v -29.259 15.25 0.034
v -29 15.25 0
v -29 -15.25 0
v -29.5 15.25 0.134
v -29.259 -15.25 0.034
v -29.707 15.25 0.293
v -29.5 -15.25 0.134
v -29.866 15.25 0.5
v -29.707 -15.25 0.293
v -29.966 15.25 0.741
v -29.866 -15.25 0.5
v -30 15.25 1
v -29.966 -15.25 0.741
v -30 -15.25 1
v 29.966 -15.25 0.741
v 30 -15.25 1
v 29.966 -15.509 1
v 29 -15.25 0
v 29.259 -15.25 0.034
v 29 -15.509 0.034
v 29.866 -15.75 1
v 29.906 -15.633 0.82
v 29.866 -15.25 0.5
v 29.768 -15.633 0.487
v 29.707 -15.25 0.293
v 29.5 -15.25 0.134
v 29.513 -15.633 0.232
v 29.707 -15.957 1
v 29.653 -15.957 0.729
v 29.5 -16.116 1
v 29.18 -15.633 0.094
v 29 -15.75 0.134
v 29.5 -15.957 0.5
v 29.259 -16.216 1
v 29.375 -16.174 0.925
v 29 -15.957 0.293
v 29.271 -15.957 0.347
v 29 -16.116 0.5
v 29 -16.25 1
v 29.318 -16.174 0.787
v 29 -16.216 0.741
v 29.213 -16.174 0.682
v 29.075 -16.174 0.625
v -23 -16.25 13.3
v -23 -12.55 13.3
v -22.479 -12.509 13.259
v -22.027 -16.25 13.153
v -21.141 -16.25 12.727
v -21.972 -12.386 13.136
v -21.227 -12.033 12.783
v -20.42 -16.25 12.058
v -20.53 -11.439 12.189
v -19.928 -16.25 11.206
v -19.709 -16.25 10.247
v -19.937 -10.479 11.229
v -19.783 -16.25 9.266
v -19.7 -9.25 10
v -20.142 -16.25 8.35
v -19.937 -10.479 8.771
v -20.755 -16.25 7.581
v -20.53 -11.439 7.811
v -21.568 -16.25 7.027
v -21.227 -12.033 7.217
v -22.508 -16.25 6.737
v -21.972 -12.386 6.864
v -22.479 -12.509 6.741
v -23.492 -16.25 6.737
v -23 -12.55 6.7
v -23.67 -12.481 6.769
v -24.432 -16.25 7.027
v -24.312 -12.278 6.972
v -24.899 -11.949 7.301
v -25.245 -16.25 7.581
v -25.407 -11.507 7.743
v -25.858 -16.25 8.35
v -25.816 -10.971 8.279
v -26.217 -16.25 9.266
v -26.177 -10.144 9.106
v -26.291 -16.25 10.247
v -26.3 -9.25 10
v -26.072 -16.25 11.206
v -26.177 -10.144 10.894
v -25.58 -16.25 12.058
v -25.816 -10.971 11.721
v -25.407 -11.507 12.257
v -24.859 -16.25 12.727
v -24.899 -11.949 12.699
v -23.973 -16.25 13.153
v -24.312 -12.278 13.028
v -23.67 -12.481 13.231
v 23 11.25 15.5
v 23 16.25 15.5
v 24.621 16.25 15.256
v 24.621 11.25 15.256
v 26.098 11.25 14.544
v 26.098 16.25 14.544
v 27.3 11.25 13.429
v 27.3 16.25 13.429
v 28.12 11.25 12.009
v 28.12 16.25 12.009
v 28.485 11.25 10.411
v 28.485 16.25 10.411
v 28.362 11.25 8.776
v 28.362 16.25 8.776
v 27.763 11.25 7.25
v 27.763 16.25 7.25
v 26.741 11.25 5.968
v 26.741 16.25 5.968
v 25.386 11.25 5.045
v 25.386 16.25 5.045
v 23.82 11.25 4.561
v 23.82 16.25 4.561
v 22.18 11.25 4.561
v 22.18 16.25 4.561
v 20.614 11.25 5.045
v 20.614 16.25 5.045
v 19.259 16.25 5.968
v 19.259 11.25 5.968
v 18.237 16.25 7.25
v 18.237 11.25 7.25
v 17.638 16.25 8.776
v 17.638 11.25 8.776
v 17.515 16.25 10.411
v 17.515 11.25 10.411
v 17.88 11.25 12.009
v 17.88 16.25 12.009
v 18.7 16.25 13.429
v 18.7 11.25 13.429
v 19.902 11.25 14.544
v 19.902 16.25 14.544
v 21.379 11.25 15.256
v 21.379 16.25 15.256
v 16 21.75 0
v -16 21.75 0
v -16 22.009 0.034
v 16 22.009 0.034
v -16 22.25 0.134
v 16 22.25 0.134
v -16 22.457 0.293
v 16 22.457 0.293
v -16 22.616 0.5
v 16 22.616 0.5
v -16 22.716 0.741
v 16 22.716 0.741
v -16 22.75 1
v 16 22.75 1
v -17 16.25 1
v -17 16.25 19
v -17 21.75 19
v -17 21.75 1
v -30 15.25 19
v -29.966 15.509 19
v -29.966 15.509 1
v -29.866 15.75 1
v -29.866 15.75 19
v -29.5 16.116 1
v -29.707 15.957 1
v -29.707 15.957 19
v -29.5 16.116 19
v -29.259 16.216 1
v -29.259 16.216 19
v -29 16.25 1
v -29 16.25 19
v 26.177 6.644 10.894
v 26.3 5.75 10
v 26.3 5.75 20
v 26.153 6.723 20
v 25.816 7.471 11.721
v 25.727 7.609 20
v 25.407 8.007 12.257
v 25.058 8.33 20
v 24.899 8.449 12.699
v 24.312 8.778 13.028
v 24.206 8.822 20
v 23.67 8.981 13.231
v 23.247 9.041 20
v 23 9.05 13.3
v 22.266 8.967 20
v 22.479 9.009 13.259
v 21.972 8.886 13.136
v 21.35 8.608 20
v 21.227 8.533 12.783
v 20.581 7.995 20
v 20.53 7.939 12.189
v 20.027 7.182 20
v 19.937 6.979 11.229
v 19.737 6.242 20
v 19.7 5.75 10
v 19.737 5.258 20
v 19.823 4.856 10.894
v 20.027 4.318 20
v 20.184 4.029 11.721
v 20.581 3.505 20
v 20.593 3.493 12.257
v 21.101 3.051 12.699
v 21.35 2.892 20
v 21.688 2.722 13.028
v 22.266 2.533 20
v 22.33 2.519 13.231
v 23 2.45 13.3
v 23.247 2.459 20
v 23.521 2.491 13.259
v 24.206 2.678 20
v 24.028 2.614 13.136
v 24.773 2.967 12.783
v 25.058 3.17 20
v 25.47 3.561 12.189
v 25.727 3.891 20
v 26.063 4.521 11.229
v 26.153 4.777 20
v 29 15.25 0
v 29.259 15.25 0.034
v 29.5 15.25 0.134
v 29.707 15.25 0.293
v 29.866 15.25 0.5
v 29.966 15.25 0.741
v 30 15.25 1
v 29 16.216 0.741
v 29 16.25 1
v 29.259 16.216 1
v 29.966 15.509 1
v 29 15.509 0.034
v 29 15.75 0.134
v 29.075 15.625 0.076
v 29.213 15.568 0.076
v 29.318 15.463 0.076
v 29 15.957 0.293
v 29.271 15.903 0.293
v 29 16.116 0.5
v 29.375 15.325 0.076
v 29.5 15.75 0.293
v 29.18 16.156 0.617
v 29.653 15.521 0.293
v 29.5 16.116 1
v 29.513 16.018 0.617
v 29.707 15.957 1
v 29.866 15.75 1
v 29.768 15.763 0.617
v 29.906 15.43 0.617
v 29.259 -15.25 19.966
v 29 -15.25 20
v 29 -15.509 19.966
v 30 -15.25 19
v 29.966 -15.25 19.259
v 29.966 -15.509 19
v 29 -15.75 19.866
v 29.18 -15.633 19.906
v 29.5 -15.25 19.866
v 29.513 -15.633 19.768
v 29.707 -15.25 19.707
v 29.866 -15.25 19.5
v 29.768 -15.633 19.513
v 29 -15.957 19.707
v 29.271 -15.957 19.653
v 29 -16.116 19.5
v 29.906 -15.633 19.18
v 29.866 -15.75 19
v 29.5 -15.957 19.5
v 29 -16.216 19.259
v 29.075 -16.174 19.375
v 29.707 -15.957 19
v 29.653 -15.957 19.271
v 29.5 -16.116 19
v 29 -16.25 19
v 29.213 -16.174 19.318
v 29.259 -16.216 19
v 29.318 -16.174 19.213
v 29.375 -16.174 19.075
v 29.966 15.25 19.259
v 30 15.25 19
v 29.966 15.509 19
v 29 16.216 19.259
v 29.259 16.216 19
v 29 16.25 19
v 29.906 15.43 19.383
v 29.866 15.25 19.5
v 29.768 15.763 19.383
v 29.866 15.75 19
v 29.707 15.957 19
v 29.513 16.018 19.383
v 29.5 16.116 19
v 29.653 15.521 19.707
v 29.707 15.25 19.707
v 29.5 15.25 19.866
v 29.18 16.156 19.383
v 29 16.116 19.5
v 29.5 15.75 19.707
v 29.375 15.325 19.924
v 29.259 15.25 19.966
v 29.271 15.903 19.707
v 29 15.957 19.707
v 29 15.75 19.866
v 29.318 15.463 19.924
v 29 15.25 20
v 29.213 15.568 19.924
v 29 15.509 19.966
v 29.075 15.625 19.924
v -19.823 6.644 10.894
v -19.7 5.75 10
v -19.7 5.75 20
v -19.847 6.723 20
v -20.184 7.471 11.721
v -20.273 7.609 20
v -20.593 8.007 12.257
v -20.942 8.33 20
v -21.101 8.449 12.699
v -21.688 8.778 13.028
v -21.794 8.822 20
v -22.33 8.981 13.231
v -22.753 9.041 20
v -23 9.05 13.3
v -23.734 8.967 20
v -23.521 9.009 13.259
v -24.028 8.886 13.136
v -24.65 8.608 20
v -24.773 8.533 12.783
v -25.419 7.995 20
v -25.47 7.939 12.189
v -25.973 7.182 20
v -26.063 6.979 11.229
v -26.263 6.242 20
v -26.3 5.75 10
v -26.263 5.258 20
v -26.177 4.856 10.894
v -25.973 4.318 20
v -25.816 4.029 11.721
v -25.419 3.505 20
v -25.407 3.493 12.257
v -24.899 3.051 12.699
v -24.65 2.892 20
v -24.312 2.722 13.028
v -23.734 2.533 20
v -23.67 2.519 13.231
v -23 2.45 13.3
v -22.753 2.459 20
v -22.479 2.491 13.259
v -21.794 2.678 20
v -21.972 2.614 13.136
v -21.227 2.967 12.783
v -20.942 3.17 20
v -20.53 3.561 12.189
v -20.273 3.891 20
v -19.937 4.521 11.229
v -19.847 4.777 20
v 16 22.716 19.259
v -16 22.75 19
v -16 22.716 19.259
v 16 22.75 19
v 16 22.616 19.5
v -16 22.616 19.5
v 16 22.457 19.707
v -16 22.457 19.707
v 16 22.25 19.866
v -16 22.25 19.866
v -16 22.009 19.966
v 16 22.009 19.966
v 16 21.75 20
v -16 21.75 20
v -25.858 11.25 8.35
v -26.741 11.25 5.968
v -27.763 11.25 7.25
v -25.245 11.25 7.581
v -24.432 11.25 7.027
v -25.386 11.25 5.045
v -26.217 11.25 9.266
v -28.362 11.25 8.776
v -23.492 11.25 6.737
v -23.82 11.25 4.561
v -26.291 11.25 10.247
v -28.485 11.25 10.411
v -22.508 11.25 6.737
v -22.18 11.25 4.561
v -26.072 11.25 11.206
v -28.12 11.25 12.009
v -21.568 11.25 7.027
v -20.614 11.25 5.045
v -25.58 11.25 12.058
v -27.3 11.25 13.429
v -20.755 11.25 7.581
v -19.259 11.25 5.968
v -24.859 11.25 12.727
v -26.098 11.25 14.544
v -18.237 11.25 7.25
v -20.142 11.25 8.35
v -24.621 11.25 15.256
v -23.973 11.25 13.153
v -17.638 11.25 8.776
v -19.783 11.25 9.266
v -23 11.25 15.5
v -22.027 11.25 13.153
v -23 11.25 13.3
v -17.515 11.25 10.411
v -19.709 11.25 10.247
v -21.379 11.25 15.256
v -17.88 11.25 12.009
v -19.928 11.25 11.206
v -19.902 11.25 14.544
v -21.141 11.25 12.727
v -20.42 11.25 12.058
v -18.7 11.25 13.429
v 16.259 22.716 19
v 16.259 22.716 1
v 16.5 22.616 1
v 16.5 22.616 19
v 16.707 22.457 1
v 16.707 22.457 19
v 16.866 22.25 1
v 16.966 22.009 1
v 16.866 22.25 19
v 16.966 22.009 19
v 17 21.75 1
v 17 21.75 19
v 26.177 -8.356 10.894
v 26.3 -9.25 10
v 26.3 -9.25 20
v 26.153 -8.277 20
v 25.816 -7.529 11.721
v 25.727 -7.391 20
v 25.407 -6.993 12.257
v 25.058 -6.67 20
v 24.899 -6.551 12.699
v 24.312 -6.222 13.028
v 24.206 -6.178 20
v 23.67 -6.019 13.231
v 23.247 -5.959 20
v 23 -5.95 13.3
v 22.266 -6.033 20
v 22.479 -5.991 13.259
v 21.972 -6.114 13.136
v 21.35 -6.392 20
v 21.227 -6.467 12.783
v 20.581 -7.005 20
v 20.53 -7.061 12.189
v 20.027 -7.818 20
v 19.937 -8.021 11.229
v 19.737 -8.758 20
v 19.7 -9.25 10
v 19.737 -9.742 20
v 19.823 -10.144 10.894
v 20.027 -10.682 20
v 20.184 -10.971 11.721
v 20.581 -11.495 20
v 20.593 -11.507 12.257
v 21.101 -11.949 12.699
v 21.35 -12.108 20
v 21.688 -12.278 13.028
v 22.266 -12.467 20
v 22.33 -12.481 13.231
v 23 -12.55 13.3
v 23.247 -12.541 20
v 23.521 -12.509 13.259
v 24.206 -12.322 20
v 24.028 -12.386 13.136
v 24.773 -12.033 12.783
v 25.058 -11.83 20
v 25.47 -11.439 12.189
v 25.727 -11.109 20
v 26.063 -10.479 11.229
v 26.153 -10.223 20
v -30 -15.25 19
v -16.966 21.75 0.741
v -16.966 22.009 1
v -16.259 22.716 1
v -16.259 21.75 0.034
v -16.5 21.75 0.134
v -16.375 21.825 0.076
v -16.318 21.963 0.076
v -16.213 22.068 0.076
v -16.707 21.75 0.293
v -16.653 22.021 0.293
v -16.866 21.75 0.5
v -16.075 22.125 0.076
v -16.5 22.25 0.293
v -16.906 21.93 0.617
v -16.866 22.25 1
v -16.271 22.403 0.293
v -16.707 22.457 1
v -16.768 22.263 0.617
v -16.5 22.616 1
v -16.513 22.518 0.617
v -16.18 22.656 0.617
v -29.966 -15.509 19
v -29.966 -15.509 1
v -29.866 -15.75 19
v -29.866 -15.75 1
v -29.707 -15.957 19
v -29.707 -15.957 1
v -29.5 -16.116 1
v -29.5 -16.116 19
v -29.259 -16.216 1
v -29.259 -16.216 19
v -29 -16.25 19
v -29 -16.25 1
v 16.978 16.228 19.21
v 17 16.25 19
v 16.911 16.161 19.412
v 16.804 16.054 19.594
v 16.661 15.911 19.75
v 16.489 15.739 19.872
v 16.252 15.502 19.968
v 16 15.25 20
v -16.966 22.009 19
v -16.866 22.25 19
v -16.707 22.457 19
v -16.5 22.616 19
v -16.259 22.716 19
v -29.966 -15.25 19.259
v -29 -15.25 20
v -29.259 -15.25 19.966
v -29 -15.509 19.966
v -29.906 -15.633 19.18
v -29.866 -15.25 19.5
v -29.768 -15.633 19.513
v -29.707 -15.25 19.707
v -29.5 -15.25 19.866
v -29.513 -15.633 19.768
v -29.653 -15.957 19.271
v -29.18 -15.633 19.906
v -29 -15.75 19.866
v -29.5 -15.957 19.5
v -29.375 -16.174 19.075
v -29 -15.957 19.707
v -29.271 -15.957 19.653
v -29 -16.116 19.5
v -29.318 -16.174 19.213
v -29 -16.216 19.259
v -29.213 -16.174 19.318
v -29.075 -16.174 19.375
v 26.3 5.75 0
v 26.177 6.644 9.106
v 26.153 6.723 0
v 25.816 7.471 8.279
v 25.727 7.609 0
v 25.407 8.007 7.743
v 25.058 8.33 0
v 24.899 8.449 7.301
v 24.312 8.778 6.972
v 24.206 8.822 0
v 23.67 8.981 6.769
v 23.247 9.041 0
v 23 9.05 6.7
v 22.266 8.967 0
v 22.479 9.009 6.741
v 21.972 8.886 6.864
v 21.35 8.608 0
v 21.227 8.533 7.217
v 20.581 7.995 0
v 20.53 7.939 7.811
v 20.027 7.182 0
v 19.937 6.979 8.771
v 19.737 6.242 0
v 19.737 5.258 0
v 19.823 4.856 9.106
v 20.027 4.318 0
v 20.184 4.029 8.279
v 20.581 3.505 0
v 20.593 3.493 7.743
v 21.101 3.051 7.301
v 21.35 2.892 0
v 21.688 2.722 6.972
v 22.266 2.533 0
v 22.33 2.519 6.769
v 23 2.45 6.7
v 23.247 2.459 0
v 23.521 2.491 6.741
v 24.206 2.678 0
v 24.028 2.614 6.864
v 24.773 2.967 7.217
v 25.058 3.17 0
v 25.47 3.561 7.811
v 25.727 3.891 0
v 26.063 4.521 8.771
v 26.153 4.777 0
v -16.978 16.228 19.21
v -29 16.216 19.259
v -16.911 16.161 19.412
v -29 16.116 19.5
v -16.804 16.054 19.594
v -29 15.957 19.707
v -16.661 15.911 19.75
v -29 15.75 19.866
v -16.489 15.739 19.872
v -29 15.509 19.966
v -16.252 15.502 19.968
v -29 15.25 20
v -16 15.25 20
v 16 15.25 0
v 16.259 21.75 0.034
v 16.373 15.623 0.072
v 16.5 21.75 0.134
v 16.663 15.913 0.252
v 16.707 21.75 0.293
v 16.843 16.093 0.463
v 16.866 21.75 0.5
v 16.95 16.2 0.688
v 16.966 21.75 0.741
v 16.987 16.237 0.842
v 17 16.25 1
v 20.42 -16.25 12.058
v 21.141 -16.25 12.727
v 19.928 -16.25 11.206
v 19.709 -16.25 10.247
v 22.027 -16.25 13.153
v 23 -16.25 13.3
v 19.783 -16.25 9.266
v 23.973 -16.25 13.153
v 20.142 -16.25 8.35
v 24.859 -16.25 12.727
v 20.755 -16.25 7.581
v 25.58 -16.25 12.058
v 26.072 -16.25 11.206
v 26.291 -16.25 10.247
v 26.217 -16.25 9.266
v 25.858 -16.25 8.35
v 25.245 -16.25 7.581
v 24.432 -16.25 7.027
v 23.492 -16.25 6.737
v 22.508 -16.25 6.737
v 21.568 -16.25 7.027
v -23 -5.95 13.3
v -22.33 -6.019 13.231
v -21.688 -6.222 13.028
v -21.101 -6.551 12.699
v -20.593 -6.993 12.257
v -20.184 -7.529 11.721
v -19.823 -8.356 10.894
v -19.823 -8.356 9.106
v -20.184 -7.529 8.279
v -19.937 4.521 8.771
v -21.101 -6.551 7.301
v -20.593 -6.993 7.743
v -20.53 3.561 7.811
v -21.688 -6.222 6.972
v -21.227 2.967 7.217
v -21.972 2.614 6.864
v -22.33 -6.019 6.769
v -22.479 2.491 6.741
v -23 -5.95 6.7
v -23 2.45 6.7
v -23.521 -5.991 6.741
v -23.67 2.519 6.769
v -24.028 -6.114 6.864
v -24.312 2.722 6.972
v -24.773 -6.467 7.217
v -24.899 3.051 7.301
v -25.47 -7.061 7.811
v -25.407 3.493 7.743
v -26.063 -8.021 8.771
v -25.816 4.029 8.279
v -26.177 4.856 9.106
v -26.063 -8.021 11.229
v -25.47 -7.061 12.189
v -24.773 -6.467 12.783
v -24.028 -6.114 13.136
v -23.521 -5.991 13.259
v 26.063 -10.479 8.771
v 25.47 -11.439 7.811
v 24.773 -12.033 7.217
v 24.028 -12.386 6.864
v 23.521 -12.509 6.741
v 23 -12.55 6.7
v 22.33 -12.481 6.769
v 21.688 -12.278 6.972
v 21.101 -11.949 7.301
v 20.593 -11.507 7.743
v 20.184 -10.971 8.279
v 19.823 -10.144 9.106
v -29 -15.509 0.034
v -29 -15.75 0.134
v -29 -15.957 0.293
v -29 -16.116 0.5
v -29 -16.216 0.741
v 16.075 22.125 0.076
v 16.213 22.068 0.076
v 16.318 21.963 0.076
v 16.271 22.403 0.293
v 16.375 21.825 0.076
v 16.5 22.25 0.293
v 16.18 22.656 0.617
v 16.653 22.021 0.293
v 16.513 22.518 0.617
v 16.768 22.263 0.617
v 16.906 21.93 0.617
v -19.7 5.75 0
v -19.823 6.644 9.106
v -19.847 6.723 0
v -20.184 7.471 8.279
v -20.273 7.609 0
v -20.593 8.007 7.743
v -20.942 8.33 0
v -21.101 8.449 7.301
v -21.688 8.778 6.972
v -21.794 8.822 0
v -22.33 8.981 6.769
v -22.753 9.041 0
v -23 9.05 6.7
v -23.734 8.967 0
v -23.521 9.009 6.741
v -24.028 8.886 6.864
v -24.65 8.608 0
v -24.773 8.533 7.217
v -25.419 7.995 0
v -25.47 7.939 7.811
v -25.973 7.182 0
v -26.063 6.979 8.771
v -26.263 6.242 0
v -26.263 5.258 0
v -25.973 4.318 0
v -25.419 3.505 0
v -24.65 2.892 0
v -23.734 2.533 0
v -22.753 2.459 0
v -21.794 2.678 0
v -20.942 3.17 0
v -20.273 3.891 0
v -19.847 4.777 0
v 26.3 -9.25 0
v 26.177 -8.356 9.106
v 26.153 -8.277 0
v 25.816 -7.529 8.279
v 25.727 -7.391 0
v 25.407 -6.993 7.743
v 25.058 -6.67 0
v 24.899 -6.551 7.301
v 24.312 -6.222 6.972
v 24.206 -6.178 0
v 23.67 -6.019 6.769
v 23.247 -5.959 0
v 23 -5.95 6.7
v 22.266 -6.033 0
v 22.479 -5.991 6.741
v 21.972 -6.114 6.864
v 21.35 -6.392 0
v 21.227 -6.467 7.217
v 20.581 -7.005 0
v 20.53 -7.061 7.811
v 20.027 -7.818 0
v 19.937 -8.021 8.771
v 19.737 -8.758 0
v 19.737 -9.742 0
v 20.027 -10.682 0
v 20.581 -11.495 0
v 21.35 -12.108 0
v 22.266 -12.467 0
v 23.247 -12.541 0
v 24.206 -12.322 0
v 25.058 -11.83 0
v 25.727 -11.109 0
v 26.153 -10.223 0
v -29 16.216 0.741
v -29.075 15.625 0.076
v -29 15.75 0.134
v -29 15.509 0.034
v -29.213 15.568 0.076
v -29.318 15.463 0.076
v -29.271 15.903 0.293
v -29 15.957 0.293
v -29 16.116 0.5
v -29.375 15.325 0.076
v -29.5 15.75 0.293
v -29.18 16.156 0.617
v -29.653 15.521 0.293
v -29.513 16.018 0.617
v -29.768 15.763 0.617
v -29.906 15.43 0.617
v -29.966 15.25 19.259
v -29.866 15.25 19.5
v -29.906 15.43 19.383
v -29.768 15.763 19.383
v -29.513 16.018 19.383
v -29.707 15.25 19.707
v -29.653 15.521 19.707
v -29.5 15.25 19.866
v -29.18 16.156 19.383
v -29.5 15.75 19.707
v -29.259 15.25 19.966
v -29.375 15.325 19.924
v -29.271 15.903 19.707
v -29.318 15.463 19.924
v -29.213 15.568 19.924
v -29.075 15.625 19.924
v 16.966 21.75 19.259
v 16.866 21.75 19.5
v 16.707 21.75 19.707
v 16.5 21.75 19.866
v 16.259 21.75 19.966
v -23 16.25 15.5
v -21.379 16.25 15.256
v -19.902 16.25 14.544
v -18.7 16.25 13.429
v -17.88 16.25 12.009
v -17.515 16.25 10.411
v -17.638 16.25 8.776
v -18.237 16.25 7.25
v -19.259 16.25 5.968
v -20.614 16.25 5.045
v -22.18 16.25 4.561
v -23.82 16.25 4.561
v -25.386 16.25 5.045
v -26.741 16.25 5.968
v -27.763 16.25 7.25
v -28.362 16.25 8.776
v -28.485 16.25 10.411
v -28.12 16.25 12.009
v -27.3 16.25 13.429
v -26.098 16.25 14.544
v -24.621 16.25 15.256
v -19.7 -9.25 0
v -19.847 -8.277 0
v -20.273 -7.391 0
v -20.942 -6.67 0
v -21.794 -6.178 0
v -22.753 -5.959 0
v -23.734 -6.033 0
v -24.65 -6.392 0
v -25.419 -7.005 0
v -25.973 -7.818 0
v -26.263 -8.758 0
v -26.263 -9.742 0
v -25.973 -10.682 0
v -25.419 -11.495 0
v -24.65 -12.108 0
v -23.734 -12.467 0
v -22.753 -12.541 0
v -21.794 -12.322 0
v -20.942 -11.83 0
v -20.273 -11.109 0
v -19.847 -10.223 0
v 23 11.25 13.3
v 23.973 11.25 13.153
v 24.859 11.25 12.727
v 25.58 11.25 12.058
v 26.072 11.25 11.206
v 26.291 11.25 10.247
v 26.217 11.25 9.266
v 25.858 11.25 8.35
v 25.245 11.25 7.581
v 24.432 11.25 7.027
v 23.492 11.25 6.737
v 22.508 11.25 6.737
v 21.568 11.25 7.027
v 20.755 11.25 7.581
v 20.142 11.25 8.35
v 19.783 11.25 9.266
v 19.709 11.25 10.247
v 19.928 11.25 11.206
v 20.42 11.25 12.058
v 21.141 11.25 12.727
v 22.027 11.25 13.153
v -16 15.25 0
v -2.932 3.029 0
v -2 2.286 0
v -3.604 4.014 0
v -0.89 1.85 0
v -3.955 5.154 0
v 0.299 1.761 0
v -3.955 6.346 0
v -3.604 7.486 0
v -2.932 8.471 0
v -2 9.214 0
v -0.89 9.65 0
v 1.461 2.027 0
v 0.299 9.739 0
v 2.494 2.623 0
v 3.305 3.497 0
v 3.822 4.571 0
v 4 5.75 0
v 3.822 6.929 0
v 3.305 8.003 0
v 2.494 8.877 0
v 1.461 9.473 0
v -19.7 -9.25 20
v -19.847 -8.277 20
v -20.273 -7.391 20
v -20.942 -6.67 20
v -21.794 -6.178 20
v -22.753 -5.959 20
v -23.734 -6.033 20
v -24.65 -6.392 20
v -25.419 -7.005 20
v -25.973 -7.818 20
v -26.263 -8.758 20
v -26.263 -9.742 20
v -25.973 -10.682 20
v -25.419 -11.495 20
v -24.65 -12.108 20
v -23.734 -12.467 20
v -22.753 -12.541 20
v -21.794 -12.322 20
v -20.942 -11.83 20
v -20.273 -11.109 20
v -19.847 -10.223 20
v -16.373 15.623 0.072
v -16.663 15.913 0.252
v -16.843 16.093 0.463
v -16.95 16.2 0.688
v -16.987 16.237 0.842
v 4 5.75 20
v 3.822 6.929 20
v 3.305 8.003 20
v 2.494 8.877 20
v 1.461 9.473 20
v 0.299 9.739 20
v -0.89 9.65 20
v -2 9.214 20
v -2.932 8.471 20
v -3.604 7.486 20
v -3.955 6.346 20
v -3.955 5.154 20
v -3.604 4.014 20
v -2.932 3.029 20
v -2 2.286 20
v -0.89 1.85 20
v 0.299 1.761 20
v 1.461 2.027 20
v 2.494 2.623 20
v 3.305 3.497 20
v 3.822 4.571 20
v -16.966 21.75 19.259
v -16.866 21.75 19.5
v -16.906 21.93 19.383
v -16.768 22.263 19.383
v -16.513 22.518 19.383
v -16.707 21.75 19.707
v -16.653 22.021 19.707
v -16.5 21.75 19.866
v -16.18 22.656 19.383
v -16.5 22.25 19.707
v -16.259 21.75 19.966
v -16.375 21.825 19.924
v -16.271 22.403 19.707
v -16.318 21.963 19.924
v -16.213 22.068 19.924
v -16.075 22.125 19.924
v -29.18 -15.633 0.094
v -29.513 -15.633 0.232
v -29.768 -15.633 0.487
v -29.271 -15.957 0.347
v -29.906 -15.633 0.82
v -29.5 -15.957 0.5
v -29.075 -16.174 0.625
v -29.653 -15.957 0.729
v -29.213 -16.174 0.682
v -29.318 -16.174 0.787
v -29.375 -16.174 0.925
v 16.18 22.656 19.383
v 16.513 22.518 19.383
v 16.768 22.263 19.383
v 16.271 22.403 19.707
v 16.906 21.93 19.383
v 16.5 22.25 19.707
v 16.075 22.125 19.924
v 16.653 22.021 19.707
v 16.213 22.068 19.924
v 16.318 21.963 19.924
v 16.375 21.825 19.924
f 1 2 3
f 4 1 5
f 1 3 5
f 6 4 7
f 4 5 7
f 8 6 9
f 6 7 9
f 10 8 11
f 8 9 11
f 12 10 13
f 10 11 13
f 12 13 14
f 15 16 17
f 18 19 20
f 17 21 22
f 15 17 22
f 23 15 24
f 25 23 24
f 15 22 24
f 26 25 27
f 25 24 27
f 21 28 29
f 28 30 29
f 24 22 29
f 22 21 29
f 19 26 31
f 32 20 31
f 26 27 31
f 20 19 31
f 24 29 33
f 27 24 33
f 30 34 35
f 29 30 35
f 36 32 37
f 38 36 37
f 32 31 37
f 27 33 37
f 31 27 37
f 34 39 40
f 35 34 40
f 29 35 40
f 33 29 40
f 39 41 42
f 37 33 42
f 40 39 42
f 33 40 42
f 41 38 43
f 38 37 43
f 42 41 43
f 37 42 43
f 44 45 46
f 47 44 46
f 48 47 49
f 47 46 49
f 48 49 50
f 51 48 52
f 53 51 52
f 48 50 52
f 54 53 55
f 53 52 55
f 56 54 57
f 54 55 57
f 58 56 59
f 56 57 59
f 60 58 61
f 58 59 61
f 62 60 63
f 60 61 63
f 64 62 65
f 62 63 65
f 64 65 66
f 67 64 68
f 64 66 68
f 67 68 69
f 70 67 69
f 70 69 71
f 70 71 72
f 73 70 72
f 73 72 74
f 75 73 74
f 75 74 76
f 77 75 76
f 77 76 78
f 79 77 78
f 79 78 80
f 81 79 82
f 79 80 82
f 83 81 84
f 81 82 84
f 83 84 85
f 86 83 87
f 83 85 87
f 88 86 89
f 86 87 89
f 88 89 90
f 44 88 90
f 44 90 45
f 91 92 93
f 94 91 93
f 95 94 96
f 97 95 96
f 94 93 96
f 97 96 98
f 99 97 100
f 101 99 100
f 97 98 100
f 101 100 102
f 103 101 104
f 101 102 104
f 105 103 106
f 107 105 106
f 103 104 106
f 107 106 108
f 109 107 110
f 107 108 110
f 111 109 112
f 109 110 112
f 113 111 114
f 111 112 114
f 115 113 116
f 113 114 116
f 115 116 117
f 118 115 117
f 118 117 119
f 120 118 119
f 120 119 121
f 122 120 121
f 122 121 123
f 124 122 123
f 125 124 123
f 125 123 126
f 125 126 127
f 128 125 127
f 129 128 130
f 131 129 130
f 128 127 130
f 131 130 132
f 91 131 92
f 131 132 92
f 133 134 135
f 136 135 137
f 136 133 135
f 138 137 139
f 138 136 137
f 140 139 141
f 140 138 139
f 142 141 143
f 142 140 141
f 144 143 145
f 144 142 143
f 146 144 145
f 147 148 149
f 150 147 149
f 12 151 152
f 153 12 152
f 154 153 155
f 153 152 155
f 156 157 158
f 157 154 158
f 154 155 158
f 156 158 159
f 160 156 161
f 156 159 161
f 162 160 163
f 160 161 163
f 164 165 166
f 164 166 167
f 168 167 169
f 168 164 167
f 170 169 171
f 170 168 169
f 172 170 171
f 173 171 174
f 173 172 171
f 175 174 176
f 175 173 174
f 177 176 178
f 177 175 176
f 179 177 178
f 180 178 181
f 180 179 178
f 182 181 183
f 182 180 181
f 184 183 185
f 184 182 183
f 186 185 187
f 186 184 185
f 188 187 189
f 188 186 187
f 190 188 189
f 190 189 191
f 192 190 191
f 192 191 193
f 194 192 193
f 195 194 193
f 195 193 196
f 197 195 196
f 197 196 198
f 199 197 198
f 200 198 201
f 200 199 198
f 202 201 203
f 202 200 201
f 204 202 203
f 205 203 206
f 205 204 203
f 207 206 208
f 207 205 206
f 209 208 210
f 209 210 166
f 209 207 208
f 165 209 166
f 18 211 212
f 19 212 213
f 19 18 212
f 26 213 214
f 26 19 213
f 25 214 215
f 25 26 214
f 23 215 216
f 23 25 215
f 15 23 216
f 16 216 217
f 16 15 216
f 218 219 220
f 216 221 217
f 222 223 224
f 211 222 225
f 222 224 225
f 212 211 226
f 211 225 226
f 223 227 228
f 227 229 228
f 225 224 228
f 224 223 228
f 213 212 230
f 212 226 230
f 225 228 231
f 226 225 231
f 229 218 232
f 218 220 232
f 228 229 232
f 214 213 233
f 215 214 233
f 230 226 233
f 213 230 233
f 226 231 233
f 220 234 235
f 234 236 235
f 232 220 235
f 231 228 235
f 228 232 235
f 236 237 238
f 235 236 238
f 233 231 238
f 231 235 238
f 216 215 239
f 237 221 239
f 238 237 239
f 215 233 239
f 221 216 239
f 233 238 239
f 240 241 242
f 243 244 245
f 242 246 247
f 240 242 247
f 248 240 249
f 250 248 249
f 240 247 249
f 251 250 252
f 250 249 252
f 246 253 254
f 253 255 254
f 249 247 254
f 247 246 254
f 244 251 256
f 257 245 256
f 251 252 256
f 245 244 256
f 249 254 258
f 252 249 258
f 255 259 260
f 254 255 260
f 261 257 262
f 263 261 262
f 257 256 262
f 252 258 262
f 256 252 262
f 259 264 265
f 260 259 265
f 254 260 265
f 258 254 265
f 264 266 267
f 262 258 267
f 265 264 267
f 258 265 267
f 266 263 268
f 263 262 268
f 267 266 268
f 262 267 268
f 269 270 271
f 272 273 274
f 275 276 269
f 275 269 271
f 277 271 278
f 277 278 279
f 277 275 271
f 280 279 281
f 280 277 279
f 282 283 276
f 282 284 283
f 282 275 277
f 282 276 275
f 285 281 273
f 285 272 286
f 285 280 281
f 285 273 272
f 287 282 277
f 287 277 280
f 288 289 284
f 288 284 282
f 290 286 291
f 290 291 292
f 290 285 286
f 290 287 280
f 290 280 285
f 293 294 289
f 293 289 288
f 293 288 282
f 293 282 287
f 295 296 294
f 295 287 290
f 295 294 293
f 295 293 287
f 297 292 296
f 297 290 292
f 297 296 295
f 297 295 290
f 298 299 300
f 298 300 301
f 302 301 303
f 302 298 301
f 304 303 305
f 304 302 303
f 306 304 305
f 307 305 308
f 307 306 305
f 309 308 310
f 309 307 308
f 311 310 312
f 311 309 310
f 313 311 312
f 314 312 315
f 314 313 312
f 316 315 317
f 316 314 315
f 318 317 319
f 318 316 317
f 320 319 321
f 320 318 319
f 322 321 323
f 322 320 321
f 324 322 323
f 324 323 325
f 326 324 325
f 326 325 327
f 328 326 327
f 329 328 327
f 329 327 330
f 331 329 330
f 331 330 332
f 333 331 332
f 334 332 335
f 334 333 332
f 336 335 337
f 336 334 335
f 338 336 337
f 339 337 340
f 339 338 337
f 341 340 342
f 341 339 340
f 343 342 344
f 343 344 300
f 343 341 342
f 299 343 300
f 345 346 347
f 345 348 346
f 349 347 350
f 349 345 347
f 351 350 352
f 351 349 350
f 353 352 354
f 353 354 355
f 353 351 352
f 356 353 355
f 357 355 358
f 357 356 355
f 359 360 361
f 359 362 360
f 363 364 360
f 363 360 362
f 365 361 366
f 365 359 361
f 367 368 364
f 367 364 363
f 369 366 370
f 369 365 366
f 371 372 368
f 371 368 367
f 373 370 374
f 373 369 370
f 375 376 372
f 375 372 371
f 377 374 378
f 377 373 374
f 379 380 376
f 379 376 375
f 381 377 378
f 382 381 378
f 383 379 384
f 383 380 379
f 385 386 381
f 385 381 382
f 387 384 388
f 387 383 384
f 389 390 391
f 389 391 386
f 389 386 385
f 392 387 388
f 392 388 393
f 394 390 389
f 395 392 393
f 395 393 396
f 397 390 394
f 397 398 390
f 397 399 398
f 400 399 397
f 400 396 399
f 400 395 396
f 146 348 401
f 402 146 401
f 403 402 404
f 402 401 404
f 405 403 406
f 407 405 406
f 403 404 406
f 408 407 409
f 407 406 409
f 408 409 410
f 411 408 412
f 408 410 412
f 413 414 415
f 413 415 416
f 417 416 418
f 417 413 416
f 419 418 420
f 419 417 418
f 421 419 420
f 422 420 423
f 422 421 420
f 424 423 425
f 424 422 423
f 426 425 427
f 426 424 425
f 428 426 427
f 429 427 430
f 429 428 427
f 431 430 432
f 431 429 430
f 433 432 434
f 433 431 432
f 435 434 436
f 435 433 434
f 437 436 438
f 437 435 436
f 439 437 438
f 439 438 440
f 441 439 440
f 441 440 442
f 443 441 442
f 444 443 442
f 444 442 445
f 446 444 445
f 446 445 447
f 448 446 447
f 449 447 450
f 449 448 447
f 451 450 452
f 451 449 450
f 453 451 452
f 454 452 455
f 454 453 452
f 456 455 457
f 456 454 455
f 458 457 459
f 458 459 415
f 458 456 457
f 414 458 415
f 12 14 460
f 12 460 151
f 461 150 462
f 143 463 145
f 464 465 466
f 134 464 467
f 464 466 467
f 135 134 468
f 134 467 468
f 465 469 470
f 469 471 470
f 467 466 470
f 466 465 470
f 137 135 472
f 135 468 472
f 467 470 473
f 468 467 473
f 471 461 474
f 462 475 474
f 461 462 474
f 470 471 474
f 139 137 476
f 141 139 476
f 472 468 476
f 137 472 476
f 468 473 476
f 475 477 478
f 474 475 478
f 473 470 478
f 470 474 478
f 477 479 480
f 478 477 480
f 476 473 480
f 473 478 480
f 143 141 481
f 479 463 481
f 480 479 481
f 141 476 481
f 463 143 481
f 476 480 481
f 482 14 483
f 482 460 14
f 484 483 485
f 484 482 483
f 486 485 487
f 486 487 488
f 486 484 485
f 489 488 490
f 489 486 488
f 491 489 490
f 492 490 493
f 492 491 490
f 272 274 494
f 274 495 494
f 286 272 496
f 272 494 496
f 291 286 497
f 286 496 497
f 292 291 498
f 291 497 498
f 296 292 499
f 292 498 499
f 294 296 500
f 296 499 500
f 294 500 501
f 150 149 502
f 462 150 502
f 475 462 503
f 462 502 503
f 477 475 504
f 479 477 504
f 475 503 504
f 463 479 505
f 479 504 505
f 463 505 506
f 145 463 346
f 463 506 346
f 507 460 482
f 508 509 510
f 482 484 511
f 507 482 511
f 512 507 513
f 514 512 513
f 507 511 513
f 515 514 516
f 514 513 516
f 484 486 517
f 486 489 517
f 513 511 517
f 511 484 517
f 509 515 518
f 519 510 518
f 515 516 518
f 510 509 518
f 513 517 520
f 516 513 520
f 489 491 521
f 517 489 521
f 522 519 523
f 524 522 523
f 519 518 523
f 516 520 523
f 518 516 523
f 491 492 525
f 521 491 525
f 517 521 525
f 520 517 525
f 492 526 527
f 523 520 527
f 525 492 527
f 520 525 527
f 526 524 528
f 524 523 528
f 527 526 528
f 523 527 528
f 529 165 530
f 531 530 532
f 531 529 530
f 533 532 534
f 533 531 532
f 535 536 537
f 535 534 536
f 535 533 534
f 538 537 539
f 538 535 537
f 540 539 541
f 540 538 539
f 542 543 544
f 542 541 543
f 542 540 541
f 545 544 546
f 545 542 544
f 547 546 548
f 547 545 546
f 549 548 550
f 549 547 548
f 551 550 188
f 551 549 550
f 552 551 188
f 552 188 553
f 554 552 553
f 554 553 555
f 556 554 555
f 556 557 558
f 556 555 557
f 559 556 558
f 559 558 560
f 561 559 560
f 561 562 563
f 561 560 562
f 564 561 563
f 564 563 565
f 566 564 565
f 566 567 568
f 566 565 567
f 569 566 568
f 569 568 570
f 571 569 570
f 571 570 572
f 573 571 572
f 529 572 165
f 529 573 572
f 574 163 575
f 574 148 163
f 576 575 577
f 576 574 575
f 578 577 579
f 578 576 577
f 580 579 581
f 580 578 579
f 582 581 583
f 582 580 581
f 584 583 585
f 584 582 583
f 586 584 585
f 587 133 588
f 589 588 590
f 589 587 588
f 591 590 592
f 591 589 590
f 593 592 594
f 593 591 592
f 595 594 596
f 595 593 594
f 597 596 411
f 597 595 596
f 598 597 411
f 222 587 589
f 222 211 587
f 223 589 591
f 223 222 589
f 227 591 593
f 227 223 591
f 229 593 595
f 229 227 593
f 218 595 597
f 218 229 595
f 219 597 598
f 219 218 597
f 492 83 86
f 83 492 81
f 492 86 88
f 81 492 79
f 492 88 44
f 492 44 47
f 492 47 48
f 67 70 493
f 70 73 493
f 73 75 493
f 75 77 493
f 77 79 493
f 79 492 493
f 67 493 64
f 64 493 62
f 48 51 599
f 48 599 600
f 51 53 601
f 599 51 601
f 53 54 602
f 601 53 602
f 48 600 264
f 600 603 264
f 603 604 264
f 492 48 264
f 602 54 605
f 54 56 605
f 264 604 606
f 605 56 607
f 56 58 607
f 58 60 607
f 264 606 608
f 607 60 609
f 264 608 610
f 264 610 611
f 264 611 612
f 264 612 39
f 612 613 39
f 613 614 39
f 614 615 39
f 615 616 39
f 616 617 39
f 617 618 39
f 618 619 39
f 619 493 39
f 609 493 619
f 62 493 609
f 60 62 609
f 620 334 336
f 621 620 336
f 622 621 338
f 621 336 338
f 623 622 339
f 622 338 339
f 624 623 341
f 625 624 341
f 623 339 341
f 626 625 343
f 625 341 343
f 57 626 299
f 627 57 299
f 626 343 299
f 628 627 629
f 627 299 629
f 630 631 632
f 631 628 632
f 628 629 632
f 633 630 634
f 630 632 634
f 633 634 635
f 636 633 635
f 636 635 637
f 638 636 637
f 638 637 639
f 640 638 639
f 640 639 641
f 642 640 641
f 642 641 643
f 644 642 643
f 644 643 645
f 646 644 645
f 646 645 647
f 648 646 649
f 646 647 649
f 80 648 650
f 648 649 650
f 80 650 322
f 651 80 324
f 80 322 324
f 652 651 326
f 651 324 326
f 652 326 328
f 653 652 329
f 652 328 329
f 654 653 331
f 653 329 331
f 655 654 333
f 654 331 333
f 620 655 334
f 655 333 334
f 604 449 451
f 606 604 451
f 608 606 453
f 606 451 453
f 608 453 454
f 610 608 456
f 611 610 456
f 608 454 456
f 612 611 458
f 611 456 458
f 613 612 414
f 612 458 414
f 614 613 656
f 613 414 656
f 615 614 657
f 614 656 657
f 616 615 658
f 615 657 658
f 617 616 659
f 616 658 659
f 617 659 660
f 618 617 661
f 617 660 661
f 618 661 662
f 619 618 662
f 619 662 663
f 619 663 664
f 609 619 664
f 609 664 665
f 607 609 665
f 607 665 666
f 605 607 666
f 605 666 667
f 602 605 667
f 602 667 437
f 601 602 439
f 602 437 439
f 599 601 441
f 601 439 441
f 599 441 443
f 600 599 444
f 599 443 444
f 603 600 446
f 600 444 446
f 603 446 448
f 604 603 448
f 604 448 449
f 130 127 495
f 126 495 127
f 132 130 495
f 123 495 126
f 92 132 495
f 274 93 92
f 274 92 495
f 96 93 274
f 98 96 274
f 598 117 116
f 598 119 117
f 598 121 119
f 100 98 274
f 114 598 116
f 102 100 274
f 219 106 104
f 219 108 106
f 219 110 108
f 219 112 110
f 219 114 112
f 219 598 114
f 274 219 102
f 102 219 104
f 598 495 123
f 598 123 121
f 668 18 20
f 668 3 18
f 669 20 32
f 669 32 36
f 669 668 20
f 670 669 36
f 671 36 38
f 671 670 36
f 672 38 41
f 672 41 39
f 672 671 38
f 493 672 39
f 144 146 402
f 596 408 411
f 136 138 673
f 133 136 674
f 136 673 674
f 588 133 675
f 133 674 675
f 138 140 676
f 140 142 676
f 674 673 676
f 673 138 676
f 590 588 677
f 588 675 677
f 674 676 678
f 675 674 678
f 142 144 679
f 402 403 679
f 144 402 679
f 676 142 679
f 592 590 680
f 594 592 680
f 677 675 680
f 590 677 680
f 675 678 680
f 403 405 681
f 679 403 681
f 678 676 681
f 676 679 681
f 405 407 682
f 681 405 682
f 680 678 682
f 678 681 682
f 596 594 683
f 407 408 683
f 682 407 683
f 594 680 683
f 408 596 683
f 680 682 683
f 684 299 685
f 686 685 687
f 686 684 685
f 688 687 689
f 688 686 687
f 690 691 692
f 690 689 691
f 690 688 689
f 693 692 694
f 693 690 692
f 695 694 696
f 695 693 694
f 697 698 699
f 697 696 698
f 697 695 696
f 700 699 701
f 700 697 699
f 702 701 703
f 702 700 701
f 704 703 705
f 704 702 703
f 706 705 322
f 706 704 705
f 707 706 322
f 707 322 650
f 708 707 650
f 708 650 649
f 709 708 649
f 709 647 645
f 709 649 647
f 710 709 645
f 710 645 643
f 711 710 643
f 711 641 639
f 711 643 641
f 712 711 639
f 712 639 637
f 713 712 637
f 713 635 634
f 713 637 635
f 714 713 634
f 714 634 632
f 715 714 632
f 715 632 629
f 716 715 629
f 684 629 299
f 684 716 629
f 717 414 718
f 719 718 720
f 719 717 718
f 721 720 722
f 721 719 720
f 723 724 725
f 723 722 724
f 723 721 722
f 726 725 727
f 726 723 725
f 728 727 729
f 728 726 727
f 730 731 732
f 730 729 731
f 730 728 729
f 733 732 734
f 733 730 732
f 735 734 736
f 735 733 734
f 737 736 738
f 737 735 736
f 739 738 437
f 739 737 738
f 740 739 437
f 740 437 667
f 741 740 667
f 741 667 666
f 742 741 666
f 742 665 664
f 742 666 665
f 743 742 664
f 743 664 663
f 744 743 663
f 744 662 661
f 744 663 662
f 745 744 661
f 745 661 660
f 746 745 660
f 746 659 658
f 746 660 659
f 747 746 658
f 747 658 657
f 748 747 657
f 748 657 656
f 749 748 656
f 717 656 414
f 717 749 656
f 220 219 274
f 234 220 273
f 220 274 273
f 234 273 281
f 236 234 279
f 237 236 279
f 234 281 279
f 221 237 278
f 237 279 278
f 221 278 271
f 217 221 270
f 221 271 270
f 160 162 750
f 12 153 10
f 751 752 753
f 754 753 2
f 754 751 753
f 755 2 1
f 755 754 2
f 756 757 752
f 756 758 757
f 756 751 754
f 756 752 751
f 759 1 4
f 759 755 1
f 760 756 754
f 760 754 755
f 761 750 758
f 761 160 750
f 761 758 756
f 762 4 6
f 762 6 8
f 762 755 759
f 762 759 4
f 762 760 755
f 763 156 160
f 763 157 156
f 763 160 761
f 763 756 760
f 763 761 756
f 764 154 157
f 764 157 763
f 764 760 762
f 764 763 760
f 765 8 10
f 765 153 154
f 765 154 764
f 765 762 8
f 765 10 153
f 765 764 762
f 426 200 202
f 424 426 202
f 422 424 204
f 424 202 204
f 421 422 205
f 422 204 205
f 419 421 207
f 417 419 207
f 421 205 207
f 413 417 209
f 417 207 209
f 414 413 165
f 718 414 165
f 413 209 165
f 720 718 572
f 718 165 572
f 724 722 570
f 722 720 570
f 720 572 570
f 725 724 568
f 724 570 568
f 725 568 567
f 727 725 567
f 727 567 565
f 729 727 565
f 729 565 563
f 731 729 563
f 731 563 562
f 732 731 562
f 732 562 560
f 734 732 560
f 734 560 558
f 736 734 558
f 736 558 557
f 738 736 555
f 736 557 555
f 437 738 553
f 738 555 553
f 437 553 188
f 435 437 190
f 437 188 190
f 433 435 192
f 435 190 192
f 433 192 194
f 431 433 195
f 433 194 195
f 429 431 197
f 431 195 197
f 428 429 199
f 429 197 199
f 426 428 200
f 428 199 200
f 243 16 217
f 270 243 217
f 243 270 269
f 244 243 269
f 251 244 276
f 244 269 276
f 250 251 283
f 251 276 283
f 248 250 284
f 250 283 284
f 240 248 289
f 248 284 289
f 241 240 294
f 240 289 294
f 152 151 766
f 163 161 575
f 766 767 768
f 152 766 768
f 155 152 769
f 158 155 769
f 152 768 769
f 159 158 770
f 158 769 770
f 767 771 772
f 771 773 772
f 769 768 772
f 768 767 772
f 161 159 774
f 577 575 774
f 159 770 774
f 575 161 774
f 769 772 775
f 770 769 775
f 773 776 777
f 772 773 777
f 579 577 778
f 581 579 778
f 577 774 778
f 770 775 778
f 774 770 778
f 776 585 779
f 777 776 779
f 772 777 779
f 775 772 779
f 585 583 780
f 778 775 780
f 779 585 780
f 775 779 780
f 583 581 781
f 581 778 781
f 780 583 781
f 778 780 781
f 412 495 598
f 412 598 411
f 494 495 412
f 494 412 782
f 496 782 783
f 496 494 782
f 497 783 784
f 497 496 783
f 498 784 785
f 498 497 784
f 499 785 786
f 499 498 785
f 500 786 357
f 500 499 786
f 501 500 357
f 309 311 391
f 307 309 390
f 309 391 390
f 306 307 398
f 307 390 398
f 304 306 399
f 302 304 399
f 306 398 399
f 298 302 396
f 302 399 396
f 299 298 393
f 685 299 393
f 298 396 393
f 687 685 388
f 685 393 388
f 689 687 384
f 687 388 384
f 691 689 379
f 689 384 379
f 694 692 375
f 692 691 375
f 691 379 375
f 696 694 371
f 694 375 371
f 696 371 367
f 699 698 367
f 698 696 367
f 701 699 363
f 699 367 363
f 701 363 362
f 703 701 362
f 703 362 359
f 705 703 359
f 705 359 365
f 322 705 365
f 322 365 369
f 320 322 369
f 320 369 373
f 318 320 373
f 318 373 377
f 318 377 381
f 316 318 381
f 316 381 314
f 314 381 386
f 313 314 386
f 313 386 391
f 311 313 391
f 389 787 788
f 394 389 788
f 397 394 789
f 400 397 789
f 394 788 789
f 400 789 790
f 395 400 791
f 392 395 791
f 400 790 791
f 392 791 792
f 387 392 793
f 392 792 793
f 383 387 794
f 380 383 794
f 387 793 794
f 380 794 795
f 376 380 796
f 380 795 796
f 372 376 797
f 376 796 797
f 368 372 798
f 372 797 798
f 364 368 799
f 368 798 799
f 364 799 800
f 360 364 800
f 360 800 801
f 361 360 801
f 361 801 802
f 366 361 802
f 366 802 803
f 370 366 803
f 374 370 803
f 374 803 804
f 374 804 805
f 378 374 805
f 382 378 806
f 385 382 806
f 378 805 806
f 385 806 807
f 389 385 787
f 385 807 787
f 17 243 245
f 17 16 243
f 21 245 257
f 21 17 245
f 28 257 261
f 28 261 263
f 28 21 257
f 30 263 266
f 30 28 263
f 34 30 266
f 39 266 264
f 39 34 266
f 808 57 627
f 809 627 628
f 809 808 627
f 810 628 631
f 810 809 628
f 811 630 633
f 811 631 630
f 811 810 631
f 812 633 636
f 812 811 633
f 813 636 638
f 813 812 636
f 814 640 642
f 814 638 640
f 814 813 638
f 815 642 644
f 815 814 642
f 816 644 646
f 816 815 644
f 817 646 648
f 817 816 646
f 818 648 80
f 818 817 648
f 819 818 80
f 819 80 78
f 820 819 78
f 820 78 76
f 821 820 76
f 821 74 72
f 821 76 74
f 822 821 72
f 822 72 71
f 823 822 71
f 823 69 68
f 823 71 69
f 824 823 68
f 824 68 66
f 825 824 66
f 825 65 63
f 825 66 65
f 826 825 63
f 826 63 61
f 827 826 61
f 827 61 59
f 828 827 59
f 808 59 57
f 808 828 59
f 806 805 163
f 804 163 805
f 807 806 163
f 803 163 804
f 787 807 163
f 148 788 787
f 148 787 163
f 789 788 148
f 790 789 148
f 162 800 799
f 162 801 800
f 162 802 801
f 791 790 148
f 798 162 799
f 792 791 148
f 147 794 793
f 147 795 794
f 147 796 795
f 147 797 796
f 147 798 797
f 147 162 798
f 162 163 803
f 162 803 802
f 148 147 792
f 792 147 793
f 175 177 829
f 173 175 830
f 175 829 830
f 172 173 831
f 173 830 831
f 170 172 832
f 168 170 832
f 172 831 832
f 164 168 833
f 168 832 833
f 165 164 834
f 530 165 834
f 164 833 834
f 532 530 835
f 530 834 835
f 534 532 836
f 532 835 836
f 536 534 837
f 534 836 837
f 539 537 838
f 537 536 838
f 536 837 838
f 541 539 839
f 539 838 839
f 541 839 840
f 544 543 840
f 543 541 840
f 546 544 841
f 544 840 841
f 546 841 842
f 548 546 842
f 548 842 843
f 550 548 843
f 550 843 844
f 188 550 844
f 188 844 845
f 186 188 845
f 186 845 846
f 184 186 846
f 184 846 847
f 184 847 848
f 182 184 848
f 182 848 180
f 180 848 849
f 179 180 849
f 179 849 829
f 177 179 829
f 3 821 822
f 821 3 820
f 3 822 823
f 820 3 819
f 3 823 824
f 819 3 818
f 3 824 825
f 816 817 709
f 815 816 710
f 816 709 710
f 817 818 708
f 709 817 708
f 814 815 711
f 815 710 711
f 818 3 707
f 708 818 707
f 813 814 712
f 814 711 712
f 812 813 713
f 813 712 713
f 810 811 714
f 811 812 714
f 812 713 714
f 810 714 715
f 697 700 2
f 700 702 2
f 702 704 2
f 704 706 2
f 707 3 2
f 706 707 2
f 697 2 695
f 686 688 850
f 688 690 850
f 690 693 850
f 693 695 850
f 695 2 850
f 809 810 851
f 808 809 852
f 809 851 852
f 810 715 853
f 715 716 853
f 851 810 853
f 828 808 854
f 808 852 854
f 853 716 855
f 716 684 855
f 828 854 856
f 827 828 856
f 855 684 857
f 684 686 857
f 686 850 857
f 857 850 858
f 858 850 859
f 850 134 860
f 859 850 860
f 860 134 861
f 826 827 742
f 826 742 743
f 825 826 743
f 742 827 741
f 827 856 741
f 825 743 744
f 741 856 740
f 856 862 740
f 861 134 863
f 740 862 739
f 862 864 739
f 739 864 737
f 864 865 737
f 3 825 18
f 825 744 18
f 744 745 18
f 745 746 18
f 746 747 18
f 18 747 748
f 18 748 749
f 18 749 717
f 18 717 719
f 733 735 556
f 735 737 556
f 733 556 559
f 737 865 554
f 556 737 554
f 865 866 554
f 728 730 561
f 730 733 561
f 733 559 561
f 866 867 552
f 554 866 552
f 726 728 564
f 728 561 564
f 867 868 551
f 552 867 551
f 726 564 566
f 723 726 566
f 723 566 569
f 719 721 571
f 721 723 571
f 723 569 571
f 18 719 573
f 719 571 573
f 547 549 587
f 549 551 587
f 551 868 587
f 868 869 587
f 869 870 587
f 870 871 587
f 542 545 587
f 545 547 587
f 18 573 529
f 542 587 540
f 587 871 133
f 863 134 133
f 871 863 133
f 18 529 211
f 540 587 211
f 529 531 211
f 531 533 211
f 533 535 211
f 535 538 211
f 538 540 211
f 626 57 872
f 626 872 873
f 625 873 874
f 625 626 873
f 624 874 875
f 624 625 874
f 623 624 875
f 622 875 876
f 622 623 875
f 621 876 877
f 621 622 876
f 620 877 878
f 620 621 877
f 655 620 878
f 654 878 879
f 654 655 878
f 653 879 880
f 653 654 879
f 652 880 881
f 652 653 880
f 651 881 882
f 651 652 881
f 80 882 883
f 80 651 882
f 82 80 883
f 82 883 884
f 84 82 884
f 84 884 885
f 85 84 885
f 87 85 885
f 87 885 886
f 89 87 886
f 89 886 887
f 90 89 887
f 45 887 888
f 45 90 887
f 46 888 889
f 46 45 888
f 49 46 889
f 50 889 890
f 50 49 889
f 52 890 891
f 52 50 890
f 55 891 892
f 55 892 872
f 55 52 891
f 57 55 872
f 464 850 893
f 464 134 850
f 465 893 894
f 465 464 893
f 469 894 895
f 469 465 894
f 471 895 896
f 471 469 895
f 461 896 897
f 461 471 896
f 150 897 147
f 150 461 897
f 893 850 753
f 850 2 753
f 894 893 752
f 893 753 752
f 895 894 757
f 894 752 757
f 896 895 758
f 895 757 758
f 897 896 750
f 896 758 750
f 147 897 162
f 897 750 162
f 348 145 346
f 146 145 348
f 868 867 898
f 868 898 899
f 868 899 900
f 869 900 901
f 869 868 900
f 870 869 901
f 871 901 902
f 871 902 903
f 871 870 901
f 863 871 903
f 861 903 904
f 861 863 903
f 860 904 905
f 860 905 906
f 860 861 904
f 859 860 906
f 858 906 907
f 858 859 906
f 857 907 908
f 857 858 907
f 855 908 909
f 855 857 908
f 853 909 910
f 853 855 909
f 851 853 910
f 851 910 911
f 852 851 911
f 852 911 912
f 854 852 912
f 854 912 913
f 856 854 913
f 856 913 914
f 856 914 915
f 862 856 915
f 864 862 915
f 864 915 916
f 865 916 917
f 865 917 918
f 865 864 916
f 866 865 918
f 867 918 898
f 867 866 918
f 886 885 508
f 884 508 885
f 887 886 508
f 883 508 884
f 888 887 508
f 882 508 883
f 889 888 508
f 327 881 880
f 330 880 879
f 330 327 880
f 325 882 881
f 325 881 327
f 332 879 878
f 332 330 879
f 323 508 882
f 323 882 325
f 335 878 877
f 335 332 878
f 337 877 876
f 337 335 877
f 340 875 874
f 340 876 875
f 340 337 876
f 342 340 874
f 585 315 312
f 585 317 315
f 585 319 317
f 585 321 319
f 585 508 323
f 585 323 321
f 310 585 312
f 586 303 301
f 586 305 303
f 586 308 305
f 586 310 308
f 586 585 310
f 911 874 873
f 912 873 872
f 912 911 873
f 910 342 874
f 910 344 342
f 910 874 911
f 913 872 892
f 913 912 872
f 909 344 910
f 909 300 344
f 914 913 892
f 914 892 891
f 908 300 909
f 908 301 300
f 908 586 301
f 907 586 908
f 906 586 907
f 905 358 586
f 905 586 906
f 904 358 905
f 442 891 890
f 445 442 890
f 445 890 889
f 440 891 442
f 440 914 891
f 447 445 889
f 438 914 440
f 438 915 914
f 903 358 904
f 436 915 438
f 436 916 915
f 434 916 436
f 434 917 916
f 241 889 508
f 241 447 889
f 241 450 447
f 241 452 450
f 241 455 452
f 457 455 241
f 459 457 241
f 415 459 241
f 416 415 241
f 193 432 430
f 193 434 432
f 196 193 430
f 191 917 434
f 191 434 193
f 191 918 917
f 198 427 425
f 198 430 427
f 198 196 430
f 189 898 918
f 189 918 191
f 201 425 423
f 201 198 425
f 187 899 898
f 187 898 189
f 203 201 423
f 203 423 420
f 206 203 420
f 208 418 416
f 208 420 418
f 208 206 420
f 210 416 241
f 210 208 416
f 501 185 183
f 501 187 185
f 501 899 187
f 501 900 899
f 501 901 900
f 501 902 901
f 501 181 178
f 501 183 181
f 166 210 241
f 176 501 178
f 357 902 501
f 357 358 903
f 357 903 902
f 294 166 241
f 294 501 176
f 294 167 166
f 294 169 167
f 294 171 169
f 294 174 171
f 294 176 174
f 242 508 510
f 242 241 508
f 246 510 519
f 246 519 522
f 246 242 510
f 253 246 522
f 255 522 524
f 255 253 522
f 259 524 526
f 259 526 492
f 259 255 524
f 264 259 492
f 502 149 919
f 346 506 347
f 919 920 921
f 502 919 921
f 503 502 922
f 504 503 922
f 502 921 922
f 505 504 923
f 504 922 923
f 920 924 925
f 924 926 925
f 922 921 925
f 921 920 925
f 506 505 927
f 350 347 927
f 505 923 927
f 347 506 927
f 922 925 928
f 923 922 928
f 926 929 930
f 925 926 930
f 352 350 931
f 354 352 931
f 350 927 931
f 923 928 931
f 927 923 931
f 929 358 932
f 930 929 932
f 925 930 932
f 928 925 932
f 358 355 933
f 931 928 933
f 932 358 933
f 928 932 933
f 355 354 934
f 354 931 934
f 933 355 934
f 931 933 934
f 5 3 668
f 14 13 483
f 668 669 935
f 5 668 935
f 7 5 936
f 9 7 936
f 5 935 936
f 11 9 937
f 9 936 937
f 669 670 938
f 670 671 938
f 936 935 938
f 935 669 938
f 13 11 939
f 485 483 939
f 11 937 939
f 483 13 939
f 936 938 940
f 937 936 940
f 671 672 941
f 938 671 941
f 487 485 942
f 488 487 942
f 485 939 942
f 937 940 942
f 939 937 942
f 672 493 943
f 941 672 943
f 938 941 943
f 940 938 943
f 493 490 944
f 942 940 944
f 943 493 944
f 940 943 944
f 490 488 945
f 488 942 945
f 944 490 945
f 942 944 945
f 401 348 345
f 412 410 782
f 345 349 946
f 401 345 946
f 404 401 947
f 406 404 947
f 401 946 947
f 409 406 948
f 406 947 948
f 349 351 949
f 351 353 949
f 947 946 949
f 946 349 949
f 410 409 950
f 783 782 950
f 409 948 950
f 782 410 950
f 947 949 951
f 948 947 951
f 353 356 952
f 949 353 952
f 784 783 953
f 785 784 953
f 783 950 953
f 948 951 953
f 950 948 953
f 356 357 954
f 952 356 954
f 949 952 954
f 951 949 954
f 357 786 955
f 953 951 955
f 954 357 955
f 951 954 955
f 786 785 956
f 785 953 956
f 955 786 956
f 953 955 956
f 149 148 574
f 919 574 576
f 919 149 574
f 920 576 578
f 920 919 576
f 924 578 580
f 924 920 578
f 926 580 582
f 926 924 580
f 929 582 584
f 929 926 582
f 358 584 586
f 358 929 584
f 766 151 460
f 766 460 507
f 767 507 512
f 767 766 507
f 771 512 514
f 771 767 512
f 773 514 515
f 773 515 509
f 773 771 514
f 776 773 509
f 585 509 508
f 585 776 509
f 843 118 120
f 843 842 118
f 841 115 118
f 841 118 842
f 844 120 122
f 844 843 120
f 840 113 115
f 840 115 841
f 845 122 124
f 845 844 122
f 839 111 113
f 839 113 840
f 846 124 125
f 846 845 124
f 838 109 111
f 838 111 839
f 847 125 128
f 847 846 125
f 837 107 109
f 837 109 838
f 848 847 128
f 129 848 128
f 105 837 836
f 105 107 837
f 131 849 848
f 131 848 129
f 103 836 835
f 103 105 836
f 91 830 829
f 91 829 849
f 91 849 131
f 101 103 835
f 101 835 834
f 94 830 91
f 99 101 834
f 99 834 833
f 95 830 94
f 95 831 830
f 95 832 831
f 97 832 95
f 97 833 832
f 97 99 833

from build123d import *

# Parameters (mm, degrees)
SKETCH_1_W               = 60
SKETCH_1_H               = 32.5
SKETCH_1_R               = 4
SKETCH_1_R_2             = 3.3
SKETCH_1_W_2             = 34
SKETCH_1_H_2             = 6.5
EXTRUDE_1_DEPTH          = 20
SKETCH_4_R               = 5.5
CUT_EXTRUDE_1_DEPTH      = 49.541219597
CUT_EXTRUDE_1_DEPTH_BACK = 5
FILLET_1_R               = 1
FILLET_2_R               = 1
FILLET_4_R               = 1
FILLET_5_R               = 1
FILLET_6_R               = 1
FILLET_7_R               = 1
FILLET_8_R               = 1
FILLET_9_R               = 1
FILLET_10_R              = 1
FILLET_11_R              = 1
FILLET_12_R              = 1
SKETCH_5_R               = 3.3
CUT_EXTRUDE_2_DEPTH      = 89


with BuildPart() as part:
    # 草图1 → 凸台-拉伸1 (new body)
    with BuildSketch(Plane.XY):
        Rectangle(SKETCH_1_W, SKETCH_1_H)
        with Locations((0, 5.75)):
            Circle(SKETCH_1_R, mode=Mode.SUBTRACT)
        with Locations((-23, 5.75)):
            Circle(SKETCH_1_R_2, mode=Mode.SUBTRACT)
        with Locations((-23, -9.25)):
            Circle(SKETCH_1_R_2, mode=Mode.SUBTRACT)
        with Locations((23, -9.25)):
            Circle(SKETCH_1_R_2, mode=Mode.SUBTRACT)
        with Locations((23, 5.75)):
            Circle(SKETCH_1_R_2, mode=Mode.SUBTRACT)
        with Locations((0, 19.5)):
            Rectangle(SKETCH_1_W_2, SKETCH_1_H_2)
    extrude(amount=EXTRUDE_1_DEPTH)

    # 草图4 → 切除-拉伸1 (cut, two sides)
    with BuildSketch(Plane(origin=(0, 16.25, 0), x_dir=(1, 0, 0), z_dir=(0, 1, 0))) as cut_extrude_1_sk:
        with Locations(Location((-23, -10, 0), (0, 0, 270))):
            Circle(SKETCH_4_R)
        with Locations(Location((23, -10, 0), (0, 0, 270))):
            Circle(SKETCH_4_R)
    extrude(amount=CUT_EXTRUDE_1_DEPTH, mode=Mode.SUBTRACT)
    extrude(cut_extrude_1_sk.sketch, amount=-CUT_EXTRUDE_1_DEPTH_BACK, mode=Mode.SUBTRACT)

    # 圆角1
    fillet_1_edges = [part.edges().sort_by_distance(p)[0] for p in [
        (-17, 22.75, 10),
    ]]
    fillet(fillet_1_edges, radius=FILLET_1_R)

    # 圆角2
    fillet_2_edges = [part.edges().sort_by_distance(p)[0] for p in [
        (17, 22.75, 10),
    ]]
    fillet(fillet_2_edges, radius=FILLET_2_R)

    # 圆角4
    fillet_4_edges = [part.edges().sort_by_distance(p)[0] for p in [
        (30, 16.25, 10),
    ]]
    fillet(fillet_4_edges, radius=FILLET_4_R)

    # 圆角5
    fillet_5_edges = [part.edges().sort_by_distance(p)[0] for p in [
        (-30, 16.25, 10),
    ]]
    fillet(fillet_5_edges, radius=FILLET_5_R)

    # 圆角6
    fillet_6_edges = [part.edges().sort_by_distance(p)[0] for p in [
        (-17, 19, 20),
        (0, 22.75, 20),
        (-16.707106781, 22.457106781, 20),
        (17, 19, 20),
        (16.707106781, 22.457106781, 20),
    ]]
    fillet(fillet_6_edges, radius=FILLET_6_R)

    # 圆角7
    fillet_7_edges = [part.edges().sort_by_distance(p)[0] for p in [
        (-17, 19, 0),
        (0, 22.75, 0),
        (-16.707106781, 22.457106781, 0),
        (17, 19, 0),
        (16.707106781, 22.457106781, 0),
    ]]
    fillet(fillet_7_edges, radius=FILLET_7_R)

    # 圆角8
    fillet_8_edges = [part.edges().sort_by_distance(p)[0] for p in [
        (-22.5, 16.25, 20),
        (-30, -0.5, 20),
        (-29.707106781, 15.957106781, 20),
    ]]
    fillet(fillet_8_edges, radius=FILLET_8_R)

    # 圆角9
    fillet_9_edges = [part.edges().sort_by_distance(p)[0] for p in [
        (22.5, 16.25, 20),
        (30, -0.5, 20),
        (29.707106781, 15.957106781, 20),
    ]]
    fillet(fillet_9_edges, radius=FILLET_9_R)

    # 圆角10
    fillet_10_edges = [part.edges().sort_by_distance(p)[0] for p in [
        (22.5, 16.25, 0),
        (30, -0.5, 0),
        (29.707106781, 15.957106781, 0),
    ]]
    fillet(fillet_10_edges, radius=FILLET_10_R)

    # 圆角11
    fillet_11_edges = [part.edges().sort_by_distance(p)[0] for p in [
        (-22.5, 16.25, 0),
        (-30, -0.5, 0),
        (-29.707106781, 15.957106781, 0),
    ]]
    fillet(fillet_11_edges, radius=FILLET_11_R)

    # 圆角12
    fillet_12_edges = [part.edges().sort_by_distance(p)[0] for p in [
        (-30, -16.25, 10),
        (0, -16.25, 20),
        (-29.707106781, -16.25, 19.707106781),
        (30, -16.25, 10),
        (29.707106781, -16.25, 19.707106781),
        (29.707106781, -16.25, 0.292893219),
        (0, -16.25, 0),
        (-29.707106781, -16.25, 0.292893219),
    ]]
    fillet(fillet_12_edges, radius=FILLET_12_R)

    # 草图5 → 切除-拉伸2 (cut)
    with BuildSketch(Plane(origin=(0, 11.25, 0), x_dir=(1, 0, 0), z_dir=(0, 1, 0))):
        with Locations(Location((-23, -10, 0), (0, 0, 270))):
            Circle(SKETCH_5_R)
        with Locations(Location((23, -10, 0), (0, 0, 270))):
            Circle(SKETCH_5_R)
    extrude(amount=-CUT_EXTRUDE_2_DEPTH, mode=Mode.SUBTRACT)


solid = part.part
